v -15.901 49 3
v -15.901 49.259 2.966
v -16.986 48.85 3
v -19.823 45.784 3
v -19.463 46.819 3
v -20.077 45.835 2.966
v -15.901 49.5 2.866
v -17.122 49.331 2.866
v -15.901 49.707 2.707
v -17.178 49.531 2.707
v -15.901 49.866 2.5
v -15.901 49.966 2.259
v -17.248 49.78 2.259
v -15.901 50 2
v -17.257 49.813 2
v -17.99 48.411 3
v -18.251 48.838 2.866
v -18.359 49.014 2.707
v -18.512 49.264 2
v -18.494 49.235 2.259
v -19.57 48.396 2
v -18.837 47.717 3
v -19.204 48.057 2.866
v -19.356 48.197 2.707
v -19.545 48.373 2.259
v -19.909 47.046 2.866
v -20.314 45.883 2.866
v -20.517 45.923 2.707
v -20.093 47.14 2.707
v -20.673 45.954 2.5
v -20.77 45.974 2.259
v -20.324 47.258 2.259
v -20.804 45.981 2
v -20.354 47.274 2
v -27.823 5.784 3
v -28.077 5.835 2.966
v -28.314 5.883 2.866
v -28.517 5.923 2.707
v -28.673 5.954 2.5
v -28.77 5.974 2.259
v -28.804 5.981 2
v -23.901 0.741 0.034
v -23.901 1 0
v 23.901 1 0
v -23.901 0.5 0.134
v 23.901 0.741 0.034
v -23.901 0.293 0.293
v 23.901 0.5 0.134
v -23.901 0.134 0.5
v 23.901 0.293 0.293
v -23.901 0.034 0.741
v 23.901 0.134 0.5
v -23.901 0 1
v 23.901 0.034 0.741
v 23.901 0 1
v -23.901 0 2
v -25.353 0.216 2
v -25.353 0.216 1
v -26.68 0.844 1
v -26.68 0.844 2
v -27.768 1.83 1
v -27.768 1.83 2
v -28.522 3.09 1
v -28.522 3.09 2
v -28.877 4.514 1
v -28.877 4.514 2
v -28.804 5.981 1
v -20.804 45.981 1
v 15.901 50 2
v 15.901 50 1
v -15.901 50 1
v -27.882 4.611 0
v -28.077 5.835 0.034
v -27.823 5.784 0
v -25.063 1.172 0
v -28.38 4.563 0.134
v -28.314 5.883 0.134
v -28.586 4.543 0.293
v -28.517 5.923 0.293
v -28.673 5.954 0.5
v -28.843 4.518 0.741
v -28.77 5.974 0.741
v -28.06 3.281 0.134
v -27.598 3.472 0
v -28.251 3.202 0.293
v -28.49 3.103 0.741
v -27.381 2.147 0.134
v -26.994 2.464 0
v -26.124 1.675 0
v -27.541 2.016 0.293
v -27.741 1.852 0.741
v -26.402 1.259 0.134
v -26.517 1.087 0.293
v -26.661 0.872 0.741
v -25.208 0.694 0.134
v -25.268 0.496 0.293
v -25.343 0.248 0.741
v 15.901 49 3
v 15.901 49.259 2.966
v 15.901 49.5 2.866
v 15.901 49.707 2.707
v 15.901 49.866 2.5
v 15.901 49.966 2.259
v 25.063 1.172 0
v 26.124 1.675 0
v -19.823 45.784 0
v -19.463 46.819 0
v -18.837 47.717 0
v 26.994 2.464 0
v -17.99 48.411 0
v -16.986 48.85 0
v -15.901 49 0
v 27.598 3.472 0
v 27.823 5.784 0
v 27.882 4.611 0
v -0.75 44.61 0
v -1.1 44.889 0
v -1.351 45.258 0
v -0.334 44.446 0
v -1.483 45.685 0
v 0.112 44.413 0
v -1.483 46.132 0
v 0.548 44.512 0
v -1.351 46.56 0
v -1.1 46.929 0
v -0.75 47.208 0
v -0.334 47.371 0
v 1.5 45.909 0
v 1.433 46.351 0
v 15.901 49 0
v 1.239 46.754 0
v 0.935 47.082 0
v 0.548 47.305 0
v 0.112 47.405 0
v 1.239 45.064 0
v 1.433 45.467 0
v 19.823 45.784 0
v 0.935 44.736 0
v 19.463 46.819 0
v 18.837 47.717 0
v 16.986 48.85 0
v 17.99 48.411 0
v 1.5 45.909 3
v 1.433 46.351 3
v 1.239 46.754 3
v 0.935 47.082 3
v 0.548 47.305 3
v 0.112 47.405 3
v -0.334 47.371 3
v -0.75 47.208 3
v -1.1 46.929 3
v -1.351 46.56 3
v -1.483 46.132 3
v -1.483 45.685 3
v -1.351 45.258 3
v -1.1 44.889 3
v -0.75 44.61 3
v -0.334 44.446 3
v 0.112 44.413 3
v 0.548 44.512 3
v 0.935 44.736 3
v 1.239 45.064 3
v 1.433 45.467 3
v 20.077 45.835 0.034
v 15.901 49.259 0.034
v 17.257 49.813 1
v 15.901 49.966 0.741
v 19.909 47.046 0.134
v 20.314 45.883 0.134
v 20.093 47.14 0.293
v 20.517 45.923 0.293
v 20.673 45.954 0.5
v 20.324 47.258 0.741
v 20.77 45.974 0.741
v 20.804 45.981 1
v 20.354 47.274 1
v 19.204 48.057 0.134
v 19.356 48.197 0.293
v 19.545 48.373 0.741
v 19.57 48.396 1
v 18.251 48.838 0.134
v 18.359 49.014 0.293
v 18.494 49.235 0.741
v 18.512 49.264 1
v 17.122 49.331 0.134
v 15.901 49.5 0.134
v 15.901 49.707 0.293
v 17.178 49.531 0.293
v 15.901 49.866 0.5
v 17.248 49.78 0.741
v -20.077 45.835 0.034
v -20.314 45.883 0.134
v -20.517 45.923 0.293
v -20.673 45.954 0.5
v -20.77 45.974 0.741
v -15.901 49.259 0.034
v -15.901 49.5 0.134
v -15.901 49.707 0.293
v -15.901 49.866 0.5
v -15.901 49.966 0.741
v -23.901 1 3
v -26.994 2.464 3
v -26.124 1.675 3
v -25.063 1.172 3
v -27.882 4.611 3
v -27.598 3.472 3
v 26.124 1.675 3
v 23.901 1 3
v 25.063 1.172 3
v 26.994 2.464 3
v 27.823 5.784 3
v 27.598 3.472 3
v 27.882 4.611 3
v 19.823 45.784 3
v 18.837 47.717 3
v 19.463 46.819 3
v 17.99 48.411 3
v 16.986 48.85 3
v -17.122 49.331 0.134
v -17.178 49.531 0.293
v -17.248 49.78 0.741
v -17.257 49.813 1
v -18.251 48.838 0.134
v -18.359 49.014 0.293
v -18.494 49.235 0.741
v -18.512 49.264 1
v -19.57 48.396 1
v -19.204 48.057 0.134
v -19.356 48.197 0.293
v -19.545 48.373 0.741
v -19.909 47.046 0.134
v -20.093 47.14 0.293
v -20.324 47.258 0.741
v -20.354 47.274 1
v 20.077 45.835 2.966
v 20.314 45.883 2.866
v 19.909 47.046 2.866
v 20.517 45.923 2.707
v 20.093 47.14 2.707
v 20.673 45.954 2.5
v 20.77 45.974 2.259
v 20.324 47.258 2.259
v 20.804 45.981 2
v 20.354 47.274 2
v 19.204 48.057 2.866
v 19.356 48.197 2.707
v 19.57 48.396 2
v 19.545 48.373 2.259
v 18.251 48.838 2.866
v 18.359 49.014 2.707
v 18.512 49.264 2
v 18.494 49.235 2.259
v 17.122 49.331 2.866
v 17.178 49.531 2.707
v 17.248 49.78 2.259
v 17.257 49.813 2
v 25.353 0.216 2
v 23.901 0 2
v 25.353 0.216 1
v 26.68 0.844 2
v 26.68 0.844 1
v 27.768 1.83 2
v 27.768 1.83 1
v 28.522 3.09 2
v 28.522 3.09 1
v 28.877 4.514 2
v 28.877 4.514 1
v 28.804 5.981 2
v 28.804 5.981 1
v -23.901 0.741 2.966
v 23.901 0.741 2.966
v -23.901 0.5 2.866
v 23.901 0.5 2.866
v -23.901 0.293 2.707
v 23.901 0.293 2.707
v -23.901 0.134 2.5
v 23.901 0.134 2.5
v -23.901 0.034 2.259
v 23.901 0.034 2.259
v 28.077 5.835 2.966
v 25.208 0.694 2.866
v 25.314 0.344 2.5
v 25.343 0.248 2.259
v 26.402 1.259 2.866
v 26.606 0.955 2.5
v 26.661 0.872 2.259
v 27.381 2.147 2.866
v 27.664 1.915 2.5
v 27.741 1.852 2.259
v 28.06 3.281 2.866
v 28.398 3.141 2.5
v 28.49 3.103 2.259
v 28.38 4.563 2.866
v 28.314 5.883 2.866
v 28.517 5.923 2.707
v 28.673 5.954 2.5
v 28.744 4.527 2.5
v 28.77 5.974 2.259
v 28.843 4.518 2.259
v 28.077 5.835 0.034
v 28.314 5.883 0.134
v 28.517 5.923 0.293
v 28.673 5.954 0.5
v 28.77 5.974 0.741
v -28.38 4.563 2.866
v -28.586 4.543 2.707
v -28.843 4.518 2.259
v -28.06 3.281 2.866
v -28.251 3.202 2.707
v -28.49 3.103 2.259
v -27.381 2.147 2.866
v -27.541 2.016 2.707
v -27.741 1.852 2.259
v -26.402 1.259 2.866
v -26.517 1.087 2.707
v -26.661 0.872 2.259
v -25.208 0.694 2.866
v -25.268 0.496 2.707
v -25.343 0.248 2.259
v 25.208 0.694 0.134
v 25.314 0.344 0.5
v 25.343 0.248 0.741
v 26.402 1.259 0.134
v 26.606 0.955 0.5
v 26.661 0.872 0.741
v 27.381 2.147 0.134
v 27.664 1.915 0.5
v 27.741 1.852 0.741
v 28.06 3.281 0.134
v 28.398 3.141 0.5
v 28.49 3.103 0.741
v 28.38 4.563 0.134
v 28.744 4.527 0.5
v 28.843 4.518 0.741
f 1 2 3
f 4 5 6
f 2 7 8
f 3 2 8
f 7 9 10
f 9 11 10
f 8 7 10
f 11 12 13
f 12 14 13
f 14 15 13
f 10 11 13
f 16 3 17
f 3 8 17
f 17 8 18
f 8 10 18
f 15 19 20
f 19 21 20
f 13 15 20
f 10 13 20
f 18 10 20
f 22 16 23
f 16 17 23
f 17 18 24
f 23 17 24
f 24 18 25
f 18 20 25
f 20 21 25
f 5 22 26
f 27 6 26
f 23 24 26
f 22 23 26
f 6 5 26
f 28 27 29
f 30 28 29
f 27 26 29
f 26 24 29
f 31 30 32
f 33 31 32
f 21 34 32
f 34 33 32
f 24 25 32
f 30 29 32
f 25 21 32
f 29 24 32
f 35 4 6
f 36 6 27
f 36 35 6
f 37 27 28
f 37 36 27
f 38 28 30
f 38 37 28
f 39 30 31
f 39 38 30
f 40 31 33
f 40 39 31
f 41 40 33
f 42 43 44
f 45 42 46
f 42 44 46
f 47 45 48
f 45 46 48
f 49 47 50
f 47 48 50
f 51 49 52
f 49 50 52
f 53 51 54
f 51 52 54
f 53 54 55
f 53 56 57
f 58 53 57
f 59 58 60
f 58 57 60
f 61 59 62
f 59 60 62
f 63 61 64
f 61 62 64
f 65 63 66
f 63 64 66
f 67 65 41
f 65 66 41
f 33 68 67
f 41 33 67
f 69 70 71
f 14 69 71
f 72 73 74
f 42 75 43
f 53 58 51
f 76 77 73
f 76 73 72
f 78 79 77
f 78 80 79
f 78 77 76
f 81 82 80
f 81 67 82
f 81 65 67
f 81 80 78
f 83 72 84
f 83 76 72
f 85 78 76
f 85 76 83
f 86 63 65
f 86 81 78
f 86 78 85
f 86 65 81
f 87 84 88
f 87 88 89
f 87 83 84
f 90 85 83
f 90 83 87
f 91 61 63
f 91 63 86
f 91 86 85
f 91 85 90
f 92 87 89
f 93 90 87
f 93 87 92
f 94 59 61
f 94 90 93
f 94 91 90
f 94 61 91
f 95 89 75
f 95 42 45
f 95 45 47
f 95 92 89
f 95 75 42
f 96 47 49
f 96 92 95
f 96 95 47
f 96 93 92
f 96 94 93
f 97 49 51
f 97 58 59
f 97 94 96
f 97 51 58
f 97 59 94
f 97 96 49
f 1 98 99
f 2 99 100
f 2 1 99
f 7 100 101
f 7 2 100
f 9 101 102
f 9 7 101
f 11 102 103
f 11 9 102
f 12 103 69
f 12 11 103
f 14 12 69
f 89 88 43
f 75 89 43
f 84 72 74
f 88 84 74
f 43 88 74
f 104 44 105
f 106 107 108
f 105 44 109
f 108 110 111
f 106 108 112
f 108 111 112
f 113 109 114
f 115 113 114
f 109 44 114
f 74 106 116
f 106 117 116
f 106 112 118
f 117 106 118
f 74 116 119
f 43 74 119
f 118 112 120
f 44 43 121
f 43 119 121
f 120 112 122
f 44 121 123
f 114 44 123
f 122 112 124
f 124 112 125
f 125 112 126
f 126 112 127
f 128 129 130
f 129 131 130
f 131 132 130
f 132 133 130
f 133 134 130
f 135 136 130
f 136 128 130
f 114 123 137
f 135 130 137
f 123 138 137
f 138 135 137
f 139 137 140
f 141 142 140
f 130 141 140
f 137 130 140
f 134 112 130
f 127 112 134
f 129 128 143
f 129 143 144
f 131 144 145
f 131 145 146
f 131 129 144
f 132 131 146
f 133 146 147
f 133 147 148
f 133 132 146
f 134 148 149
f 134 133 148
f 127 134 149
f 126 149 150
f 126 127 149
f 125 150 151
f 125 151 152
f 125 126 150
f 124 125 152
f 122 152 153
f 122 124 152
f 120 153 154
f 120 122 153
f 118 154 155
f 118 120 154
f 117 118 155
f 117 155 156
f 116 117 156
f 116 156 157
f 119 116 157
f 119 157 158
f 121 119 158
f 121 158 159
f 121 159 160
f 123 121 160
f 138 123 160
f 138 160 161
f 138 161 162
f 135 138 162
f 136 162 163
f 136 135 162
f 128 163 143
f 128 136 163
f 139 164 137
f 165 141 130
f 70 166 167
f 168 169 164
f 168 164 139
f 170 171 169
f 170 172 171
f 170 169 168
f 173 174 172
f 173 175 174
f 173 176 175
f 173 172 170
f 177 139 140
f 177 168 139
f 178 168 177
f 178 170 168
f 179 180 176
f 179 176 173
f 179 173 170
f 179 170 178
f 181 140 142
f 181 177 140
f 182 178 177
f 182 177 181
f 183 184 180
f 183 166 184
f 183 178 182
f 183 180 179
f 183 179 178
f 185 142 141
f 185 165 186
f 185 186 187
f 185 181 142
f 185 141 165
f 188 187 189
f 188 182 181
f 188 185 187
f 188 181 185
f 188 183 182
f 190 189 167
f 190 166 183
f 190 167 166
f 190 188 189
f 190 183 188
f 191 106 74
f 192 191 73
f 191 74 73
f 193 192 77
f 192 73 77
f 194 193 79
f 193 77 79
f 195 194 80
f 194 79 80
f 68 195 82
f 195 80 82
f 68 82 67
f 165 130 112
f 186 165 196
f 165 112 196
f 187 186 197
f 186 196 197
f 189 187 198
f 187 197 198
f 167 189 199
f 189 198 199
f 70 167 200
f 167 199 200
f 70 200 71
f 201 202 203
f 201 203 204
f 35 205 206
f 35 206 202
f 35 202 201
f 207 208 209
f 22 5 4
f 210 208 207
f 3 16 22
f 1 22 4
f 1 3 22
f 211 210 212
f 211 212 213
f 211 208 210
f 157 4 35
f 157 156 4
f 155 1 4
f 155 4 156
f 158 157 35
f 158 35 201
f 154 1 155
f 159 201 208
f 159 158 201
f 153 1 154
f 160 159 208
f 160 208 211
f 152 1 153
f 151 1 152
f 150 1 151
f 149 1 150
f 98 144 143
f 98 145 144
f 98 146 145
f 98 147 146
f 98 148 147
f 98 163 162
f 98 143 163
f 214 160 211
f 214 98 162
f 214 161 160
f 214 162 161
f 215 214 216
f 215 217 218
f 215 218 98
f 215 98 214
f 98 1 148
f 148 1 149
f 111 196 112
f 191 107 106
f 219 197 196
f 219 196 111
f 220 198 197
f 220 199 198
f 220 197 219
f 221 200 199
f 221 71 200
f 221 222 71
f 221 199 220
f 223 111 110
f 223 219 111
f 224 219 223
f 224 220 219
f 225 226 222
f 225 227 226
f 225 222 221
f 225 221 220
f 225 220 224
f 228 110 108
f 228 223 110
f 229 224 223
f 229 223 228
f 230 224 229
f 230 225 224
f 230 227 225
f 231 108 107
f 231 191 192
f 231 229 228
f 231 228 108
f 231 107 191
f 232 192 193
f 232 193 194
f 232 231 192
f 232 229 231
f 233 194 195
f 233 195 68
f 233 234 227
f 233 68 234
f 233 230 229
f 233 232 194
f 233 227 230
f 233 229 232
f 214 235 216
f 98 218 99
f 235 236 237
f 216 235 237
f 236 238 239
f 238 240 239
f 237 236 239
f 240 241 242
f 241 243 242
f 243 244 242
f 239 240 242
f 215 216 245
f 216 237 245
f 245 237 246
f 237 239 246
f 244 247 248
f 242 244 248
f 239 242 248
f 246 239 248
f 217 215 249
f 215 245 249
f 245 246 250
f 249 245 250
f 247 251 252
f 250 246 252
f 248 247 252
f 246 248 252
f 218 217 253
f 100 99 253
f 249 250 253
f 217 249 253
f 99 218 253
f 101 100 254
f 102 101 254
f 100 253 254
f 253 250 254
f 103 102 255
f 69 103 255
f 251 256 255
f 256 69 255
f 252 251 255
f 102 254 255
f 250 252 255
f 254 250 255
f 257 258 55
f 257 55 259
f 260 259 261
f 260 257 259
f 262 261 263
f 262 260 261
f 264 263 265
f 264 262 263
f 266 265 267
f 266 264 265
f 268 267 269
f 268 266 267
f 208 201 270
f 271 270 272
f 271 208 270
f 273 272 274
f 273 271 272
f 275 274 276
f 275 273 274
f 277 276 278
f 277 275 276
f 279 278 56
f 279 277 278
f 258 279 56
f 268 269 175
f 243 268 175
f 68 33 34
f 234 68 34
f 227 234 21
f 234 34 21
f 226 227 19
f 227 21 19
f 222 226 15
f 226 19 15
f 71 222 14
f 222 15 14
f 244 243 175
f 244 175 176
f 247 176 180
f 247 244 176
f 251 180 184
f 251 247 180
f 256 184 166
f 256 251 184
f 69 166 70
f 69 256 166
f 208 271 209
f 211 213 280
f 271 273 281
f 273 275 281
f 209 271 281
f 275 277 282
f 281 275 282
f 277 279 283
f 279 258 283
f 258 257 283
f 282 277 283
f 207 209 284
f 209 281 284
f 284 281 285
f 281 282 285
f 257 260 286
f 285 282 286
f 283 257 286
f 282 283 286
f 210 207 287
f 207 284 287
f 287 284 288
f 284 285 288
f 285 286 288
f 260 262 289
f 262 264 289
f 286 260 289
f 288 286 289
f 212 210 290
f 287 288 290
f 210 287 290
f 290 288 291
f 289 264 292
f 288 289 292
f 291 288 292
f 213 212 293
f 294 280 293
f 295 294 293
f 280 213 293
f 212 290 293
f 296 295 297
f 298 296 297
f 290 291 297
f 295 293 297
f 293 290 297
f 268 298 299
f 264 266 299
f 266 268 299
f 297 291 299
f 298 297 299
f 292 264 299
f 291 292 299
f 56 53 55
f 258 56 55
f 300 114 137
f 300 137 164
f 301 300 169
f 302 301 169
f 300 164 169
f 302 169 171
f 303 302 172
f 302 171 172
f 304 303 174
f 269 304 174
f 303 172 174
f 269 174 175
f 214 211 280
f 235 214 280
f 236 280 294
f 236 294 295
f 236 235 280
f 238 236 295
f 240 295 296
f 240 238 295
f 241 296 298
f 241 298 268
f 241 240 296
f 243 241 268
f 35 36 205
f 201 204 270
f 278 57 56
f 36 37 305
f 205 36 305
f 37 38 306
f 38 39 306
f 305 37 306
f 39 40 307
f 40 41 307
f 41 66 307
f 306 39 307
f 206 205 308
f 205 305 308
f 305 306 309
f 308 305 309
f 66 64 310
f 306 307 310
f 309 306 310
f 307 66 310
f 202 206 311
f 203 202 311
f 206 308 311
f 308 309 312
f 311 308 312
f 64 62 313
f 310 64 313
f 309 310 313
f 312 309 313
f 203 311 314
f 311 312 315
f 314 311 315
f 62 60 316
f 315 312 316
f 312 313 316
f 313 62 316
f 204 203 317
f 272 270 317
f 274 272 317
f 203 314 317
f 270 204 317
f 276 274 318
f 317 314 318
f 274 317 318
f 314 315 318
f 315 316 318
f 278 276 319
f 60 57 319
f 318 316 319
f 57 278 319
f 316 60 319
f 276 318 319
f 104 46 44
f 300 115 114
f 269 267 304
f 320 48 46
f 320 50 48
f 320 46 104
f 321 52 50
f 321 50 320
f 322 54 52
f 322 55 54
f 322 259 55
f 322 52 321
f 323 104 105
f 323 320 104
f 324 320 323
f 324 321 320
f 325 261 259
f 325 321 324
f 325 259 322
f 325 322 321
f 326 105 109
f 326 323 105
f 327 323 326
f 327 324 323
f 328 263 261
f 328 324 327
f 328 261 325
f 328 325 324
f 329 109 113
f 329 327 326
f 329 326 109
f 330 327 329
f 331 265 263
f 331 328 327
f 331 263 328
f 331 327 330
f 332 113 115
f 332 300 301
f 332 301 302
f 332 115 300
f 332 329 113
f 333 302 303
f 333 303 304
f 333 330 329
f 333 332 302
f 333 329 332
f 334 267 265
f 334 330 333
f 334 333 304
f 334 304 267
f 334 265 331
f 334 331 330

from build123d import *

# Parameters (mm, degrees)
F0_R     = 1.5
F1_DEPTH = 3
F2_R     = 5
F3_R     = 1


with BuildPart() as f1:
    # F0 (on Top) → F1 (new body)
    with BuildSketch(Plane.XY):
        Polygon((-30, 0), (0, 0), (30, 0), (20, 50), (0, 50), (-20, 50), align=None)
        with Locations((0, 45.908775)):
            Circle(F0_R, mode=Mode.SUBTRACT)
    extrude(amount=F1_DEPTH)

    # F2
    f2_edges = [f1.edges().sort_by_distance(p)[0] for p in [
        (-20, 50, 1.5),
        (20, 50, 1.5),
        (30, 0, 1.5),
        (-30, 0, 1.5),
    ]]
    fillet(f2_edges, radius=F2_R)

    # F3
    f3_edges = [f1.edges().sort_by_distance(p)[0] for p in [
        (24.803884, 25.980581, 3),
        (24.803884, 25.980581, 0),
    ]]
    fillet(f3_edges, radius=F3_R)


solid = f1.part
